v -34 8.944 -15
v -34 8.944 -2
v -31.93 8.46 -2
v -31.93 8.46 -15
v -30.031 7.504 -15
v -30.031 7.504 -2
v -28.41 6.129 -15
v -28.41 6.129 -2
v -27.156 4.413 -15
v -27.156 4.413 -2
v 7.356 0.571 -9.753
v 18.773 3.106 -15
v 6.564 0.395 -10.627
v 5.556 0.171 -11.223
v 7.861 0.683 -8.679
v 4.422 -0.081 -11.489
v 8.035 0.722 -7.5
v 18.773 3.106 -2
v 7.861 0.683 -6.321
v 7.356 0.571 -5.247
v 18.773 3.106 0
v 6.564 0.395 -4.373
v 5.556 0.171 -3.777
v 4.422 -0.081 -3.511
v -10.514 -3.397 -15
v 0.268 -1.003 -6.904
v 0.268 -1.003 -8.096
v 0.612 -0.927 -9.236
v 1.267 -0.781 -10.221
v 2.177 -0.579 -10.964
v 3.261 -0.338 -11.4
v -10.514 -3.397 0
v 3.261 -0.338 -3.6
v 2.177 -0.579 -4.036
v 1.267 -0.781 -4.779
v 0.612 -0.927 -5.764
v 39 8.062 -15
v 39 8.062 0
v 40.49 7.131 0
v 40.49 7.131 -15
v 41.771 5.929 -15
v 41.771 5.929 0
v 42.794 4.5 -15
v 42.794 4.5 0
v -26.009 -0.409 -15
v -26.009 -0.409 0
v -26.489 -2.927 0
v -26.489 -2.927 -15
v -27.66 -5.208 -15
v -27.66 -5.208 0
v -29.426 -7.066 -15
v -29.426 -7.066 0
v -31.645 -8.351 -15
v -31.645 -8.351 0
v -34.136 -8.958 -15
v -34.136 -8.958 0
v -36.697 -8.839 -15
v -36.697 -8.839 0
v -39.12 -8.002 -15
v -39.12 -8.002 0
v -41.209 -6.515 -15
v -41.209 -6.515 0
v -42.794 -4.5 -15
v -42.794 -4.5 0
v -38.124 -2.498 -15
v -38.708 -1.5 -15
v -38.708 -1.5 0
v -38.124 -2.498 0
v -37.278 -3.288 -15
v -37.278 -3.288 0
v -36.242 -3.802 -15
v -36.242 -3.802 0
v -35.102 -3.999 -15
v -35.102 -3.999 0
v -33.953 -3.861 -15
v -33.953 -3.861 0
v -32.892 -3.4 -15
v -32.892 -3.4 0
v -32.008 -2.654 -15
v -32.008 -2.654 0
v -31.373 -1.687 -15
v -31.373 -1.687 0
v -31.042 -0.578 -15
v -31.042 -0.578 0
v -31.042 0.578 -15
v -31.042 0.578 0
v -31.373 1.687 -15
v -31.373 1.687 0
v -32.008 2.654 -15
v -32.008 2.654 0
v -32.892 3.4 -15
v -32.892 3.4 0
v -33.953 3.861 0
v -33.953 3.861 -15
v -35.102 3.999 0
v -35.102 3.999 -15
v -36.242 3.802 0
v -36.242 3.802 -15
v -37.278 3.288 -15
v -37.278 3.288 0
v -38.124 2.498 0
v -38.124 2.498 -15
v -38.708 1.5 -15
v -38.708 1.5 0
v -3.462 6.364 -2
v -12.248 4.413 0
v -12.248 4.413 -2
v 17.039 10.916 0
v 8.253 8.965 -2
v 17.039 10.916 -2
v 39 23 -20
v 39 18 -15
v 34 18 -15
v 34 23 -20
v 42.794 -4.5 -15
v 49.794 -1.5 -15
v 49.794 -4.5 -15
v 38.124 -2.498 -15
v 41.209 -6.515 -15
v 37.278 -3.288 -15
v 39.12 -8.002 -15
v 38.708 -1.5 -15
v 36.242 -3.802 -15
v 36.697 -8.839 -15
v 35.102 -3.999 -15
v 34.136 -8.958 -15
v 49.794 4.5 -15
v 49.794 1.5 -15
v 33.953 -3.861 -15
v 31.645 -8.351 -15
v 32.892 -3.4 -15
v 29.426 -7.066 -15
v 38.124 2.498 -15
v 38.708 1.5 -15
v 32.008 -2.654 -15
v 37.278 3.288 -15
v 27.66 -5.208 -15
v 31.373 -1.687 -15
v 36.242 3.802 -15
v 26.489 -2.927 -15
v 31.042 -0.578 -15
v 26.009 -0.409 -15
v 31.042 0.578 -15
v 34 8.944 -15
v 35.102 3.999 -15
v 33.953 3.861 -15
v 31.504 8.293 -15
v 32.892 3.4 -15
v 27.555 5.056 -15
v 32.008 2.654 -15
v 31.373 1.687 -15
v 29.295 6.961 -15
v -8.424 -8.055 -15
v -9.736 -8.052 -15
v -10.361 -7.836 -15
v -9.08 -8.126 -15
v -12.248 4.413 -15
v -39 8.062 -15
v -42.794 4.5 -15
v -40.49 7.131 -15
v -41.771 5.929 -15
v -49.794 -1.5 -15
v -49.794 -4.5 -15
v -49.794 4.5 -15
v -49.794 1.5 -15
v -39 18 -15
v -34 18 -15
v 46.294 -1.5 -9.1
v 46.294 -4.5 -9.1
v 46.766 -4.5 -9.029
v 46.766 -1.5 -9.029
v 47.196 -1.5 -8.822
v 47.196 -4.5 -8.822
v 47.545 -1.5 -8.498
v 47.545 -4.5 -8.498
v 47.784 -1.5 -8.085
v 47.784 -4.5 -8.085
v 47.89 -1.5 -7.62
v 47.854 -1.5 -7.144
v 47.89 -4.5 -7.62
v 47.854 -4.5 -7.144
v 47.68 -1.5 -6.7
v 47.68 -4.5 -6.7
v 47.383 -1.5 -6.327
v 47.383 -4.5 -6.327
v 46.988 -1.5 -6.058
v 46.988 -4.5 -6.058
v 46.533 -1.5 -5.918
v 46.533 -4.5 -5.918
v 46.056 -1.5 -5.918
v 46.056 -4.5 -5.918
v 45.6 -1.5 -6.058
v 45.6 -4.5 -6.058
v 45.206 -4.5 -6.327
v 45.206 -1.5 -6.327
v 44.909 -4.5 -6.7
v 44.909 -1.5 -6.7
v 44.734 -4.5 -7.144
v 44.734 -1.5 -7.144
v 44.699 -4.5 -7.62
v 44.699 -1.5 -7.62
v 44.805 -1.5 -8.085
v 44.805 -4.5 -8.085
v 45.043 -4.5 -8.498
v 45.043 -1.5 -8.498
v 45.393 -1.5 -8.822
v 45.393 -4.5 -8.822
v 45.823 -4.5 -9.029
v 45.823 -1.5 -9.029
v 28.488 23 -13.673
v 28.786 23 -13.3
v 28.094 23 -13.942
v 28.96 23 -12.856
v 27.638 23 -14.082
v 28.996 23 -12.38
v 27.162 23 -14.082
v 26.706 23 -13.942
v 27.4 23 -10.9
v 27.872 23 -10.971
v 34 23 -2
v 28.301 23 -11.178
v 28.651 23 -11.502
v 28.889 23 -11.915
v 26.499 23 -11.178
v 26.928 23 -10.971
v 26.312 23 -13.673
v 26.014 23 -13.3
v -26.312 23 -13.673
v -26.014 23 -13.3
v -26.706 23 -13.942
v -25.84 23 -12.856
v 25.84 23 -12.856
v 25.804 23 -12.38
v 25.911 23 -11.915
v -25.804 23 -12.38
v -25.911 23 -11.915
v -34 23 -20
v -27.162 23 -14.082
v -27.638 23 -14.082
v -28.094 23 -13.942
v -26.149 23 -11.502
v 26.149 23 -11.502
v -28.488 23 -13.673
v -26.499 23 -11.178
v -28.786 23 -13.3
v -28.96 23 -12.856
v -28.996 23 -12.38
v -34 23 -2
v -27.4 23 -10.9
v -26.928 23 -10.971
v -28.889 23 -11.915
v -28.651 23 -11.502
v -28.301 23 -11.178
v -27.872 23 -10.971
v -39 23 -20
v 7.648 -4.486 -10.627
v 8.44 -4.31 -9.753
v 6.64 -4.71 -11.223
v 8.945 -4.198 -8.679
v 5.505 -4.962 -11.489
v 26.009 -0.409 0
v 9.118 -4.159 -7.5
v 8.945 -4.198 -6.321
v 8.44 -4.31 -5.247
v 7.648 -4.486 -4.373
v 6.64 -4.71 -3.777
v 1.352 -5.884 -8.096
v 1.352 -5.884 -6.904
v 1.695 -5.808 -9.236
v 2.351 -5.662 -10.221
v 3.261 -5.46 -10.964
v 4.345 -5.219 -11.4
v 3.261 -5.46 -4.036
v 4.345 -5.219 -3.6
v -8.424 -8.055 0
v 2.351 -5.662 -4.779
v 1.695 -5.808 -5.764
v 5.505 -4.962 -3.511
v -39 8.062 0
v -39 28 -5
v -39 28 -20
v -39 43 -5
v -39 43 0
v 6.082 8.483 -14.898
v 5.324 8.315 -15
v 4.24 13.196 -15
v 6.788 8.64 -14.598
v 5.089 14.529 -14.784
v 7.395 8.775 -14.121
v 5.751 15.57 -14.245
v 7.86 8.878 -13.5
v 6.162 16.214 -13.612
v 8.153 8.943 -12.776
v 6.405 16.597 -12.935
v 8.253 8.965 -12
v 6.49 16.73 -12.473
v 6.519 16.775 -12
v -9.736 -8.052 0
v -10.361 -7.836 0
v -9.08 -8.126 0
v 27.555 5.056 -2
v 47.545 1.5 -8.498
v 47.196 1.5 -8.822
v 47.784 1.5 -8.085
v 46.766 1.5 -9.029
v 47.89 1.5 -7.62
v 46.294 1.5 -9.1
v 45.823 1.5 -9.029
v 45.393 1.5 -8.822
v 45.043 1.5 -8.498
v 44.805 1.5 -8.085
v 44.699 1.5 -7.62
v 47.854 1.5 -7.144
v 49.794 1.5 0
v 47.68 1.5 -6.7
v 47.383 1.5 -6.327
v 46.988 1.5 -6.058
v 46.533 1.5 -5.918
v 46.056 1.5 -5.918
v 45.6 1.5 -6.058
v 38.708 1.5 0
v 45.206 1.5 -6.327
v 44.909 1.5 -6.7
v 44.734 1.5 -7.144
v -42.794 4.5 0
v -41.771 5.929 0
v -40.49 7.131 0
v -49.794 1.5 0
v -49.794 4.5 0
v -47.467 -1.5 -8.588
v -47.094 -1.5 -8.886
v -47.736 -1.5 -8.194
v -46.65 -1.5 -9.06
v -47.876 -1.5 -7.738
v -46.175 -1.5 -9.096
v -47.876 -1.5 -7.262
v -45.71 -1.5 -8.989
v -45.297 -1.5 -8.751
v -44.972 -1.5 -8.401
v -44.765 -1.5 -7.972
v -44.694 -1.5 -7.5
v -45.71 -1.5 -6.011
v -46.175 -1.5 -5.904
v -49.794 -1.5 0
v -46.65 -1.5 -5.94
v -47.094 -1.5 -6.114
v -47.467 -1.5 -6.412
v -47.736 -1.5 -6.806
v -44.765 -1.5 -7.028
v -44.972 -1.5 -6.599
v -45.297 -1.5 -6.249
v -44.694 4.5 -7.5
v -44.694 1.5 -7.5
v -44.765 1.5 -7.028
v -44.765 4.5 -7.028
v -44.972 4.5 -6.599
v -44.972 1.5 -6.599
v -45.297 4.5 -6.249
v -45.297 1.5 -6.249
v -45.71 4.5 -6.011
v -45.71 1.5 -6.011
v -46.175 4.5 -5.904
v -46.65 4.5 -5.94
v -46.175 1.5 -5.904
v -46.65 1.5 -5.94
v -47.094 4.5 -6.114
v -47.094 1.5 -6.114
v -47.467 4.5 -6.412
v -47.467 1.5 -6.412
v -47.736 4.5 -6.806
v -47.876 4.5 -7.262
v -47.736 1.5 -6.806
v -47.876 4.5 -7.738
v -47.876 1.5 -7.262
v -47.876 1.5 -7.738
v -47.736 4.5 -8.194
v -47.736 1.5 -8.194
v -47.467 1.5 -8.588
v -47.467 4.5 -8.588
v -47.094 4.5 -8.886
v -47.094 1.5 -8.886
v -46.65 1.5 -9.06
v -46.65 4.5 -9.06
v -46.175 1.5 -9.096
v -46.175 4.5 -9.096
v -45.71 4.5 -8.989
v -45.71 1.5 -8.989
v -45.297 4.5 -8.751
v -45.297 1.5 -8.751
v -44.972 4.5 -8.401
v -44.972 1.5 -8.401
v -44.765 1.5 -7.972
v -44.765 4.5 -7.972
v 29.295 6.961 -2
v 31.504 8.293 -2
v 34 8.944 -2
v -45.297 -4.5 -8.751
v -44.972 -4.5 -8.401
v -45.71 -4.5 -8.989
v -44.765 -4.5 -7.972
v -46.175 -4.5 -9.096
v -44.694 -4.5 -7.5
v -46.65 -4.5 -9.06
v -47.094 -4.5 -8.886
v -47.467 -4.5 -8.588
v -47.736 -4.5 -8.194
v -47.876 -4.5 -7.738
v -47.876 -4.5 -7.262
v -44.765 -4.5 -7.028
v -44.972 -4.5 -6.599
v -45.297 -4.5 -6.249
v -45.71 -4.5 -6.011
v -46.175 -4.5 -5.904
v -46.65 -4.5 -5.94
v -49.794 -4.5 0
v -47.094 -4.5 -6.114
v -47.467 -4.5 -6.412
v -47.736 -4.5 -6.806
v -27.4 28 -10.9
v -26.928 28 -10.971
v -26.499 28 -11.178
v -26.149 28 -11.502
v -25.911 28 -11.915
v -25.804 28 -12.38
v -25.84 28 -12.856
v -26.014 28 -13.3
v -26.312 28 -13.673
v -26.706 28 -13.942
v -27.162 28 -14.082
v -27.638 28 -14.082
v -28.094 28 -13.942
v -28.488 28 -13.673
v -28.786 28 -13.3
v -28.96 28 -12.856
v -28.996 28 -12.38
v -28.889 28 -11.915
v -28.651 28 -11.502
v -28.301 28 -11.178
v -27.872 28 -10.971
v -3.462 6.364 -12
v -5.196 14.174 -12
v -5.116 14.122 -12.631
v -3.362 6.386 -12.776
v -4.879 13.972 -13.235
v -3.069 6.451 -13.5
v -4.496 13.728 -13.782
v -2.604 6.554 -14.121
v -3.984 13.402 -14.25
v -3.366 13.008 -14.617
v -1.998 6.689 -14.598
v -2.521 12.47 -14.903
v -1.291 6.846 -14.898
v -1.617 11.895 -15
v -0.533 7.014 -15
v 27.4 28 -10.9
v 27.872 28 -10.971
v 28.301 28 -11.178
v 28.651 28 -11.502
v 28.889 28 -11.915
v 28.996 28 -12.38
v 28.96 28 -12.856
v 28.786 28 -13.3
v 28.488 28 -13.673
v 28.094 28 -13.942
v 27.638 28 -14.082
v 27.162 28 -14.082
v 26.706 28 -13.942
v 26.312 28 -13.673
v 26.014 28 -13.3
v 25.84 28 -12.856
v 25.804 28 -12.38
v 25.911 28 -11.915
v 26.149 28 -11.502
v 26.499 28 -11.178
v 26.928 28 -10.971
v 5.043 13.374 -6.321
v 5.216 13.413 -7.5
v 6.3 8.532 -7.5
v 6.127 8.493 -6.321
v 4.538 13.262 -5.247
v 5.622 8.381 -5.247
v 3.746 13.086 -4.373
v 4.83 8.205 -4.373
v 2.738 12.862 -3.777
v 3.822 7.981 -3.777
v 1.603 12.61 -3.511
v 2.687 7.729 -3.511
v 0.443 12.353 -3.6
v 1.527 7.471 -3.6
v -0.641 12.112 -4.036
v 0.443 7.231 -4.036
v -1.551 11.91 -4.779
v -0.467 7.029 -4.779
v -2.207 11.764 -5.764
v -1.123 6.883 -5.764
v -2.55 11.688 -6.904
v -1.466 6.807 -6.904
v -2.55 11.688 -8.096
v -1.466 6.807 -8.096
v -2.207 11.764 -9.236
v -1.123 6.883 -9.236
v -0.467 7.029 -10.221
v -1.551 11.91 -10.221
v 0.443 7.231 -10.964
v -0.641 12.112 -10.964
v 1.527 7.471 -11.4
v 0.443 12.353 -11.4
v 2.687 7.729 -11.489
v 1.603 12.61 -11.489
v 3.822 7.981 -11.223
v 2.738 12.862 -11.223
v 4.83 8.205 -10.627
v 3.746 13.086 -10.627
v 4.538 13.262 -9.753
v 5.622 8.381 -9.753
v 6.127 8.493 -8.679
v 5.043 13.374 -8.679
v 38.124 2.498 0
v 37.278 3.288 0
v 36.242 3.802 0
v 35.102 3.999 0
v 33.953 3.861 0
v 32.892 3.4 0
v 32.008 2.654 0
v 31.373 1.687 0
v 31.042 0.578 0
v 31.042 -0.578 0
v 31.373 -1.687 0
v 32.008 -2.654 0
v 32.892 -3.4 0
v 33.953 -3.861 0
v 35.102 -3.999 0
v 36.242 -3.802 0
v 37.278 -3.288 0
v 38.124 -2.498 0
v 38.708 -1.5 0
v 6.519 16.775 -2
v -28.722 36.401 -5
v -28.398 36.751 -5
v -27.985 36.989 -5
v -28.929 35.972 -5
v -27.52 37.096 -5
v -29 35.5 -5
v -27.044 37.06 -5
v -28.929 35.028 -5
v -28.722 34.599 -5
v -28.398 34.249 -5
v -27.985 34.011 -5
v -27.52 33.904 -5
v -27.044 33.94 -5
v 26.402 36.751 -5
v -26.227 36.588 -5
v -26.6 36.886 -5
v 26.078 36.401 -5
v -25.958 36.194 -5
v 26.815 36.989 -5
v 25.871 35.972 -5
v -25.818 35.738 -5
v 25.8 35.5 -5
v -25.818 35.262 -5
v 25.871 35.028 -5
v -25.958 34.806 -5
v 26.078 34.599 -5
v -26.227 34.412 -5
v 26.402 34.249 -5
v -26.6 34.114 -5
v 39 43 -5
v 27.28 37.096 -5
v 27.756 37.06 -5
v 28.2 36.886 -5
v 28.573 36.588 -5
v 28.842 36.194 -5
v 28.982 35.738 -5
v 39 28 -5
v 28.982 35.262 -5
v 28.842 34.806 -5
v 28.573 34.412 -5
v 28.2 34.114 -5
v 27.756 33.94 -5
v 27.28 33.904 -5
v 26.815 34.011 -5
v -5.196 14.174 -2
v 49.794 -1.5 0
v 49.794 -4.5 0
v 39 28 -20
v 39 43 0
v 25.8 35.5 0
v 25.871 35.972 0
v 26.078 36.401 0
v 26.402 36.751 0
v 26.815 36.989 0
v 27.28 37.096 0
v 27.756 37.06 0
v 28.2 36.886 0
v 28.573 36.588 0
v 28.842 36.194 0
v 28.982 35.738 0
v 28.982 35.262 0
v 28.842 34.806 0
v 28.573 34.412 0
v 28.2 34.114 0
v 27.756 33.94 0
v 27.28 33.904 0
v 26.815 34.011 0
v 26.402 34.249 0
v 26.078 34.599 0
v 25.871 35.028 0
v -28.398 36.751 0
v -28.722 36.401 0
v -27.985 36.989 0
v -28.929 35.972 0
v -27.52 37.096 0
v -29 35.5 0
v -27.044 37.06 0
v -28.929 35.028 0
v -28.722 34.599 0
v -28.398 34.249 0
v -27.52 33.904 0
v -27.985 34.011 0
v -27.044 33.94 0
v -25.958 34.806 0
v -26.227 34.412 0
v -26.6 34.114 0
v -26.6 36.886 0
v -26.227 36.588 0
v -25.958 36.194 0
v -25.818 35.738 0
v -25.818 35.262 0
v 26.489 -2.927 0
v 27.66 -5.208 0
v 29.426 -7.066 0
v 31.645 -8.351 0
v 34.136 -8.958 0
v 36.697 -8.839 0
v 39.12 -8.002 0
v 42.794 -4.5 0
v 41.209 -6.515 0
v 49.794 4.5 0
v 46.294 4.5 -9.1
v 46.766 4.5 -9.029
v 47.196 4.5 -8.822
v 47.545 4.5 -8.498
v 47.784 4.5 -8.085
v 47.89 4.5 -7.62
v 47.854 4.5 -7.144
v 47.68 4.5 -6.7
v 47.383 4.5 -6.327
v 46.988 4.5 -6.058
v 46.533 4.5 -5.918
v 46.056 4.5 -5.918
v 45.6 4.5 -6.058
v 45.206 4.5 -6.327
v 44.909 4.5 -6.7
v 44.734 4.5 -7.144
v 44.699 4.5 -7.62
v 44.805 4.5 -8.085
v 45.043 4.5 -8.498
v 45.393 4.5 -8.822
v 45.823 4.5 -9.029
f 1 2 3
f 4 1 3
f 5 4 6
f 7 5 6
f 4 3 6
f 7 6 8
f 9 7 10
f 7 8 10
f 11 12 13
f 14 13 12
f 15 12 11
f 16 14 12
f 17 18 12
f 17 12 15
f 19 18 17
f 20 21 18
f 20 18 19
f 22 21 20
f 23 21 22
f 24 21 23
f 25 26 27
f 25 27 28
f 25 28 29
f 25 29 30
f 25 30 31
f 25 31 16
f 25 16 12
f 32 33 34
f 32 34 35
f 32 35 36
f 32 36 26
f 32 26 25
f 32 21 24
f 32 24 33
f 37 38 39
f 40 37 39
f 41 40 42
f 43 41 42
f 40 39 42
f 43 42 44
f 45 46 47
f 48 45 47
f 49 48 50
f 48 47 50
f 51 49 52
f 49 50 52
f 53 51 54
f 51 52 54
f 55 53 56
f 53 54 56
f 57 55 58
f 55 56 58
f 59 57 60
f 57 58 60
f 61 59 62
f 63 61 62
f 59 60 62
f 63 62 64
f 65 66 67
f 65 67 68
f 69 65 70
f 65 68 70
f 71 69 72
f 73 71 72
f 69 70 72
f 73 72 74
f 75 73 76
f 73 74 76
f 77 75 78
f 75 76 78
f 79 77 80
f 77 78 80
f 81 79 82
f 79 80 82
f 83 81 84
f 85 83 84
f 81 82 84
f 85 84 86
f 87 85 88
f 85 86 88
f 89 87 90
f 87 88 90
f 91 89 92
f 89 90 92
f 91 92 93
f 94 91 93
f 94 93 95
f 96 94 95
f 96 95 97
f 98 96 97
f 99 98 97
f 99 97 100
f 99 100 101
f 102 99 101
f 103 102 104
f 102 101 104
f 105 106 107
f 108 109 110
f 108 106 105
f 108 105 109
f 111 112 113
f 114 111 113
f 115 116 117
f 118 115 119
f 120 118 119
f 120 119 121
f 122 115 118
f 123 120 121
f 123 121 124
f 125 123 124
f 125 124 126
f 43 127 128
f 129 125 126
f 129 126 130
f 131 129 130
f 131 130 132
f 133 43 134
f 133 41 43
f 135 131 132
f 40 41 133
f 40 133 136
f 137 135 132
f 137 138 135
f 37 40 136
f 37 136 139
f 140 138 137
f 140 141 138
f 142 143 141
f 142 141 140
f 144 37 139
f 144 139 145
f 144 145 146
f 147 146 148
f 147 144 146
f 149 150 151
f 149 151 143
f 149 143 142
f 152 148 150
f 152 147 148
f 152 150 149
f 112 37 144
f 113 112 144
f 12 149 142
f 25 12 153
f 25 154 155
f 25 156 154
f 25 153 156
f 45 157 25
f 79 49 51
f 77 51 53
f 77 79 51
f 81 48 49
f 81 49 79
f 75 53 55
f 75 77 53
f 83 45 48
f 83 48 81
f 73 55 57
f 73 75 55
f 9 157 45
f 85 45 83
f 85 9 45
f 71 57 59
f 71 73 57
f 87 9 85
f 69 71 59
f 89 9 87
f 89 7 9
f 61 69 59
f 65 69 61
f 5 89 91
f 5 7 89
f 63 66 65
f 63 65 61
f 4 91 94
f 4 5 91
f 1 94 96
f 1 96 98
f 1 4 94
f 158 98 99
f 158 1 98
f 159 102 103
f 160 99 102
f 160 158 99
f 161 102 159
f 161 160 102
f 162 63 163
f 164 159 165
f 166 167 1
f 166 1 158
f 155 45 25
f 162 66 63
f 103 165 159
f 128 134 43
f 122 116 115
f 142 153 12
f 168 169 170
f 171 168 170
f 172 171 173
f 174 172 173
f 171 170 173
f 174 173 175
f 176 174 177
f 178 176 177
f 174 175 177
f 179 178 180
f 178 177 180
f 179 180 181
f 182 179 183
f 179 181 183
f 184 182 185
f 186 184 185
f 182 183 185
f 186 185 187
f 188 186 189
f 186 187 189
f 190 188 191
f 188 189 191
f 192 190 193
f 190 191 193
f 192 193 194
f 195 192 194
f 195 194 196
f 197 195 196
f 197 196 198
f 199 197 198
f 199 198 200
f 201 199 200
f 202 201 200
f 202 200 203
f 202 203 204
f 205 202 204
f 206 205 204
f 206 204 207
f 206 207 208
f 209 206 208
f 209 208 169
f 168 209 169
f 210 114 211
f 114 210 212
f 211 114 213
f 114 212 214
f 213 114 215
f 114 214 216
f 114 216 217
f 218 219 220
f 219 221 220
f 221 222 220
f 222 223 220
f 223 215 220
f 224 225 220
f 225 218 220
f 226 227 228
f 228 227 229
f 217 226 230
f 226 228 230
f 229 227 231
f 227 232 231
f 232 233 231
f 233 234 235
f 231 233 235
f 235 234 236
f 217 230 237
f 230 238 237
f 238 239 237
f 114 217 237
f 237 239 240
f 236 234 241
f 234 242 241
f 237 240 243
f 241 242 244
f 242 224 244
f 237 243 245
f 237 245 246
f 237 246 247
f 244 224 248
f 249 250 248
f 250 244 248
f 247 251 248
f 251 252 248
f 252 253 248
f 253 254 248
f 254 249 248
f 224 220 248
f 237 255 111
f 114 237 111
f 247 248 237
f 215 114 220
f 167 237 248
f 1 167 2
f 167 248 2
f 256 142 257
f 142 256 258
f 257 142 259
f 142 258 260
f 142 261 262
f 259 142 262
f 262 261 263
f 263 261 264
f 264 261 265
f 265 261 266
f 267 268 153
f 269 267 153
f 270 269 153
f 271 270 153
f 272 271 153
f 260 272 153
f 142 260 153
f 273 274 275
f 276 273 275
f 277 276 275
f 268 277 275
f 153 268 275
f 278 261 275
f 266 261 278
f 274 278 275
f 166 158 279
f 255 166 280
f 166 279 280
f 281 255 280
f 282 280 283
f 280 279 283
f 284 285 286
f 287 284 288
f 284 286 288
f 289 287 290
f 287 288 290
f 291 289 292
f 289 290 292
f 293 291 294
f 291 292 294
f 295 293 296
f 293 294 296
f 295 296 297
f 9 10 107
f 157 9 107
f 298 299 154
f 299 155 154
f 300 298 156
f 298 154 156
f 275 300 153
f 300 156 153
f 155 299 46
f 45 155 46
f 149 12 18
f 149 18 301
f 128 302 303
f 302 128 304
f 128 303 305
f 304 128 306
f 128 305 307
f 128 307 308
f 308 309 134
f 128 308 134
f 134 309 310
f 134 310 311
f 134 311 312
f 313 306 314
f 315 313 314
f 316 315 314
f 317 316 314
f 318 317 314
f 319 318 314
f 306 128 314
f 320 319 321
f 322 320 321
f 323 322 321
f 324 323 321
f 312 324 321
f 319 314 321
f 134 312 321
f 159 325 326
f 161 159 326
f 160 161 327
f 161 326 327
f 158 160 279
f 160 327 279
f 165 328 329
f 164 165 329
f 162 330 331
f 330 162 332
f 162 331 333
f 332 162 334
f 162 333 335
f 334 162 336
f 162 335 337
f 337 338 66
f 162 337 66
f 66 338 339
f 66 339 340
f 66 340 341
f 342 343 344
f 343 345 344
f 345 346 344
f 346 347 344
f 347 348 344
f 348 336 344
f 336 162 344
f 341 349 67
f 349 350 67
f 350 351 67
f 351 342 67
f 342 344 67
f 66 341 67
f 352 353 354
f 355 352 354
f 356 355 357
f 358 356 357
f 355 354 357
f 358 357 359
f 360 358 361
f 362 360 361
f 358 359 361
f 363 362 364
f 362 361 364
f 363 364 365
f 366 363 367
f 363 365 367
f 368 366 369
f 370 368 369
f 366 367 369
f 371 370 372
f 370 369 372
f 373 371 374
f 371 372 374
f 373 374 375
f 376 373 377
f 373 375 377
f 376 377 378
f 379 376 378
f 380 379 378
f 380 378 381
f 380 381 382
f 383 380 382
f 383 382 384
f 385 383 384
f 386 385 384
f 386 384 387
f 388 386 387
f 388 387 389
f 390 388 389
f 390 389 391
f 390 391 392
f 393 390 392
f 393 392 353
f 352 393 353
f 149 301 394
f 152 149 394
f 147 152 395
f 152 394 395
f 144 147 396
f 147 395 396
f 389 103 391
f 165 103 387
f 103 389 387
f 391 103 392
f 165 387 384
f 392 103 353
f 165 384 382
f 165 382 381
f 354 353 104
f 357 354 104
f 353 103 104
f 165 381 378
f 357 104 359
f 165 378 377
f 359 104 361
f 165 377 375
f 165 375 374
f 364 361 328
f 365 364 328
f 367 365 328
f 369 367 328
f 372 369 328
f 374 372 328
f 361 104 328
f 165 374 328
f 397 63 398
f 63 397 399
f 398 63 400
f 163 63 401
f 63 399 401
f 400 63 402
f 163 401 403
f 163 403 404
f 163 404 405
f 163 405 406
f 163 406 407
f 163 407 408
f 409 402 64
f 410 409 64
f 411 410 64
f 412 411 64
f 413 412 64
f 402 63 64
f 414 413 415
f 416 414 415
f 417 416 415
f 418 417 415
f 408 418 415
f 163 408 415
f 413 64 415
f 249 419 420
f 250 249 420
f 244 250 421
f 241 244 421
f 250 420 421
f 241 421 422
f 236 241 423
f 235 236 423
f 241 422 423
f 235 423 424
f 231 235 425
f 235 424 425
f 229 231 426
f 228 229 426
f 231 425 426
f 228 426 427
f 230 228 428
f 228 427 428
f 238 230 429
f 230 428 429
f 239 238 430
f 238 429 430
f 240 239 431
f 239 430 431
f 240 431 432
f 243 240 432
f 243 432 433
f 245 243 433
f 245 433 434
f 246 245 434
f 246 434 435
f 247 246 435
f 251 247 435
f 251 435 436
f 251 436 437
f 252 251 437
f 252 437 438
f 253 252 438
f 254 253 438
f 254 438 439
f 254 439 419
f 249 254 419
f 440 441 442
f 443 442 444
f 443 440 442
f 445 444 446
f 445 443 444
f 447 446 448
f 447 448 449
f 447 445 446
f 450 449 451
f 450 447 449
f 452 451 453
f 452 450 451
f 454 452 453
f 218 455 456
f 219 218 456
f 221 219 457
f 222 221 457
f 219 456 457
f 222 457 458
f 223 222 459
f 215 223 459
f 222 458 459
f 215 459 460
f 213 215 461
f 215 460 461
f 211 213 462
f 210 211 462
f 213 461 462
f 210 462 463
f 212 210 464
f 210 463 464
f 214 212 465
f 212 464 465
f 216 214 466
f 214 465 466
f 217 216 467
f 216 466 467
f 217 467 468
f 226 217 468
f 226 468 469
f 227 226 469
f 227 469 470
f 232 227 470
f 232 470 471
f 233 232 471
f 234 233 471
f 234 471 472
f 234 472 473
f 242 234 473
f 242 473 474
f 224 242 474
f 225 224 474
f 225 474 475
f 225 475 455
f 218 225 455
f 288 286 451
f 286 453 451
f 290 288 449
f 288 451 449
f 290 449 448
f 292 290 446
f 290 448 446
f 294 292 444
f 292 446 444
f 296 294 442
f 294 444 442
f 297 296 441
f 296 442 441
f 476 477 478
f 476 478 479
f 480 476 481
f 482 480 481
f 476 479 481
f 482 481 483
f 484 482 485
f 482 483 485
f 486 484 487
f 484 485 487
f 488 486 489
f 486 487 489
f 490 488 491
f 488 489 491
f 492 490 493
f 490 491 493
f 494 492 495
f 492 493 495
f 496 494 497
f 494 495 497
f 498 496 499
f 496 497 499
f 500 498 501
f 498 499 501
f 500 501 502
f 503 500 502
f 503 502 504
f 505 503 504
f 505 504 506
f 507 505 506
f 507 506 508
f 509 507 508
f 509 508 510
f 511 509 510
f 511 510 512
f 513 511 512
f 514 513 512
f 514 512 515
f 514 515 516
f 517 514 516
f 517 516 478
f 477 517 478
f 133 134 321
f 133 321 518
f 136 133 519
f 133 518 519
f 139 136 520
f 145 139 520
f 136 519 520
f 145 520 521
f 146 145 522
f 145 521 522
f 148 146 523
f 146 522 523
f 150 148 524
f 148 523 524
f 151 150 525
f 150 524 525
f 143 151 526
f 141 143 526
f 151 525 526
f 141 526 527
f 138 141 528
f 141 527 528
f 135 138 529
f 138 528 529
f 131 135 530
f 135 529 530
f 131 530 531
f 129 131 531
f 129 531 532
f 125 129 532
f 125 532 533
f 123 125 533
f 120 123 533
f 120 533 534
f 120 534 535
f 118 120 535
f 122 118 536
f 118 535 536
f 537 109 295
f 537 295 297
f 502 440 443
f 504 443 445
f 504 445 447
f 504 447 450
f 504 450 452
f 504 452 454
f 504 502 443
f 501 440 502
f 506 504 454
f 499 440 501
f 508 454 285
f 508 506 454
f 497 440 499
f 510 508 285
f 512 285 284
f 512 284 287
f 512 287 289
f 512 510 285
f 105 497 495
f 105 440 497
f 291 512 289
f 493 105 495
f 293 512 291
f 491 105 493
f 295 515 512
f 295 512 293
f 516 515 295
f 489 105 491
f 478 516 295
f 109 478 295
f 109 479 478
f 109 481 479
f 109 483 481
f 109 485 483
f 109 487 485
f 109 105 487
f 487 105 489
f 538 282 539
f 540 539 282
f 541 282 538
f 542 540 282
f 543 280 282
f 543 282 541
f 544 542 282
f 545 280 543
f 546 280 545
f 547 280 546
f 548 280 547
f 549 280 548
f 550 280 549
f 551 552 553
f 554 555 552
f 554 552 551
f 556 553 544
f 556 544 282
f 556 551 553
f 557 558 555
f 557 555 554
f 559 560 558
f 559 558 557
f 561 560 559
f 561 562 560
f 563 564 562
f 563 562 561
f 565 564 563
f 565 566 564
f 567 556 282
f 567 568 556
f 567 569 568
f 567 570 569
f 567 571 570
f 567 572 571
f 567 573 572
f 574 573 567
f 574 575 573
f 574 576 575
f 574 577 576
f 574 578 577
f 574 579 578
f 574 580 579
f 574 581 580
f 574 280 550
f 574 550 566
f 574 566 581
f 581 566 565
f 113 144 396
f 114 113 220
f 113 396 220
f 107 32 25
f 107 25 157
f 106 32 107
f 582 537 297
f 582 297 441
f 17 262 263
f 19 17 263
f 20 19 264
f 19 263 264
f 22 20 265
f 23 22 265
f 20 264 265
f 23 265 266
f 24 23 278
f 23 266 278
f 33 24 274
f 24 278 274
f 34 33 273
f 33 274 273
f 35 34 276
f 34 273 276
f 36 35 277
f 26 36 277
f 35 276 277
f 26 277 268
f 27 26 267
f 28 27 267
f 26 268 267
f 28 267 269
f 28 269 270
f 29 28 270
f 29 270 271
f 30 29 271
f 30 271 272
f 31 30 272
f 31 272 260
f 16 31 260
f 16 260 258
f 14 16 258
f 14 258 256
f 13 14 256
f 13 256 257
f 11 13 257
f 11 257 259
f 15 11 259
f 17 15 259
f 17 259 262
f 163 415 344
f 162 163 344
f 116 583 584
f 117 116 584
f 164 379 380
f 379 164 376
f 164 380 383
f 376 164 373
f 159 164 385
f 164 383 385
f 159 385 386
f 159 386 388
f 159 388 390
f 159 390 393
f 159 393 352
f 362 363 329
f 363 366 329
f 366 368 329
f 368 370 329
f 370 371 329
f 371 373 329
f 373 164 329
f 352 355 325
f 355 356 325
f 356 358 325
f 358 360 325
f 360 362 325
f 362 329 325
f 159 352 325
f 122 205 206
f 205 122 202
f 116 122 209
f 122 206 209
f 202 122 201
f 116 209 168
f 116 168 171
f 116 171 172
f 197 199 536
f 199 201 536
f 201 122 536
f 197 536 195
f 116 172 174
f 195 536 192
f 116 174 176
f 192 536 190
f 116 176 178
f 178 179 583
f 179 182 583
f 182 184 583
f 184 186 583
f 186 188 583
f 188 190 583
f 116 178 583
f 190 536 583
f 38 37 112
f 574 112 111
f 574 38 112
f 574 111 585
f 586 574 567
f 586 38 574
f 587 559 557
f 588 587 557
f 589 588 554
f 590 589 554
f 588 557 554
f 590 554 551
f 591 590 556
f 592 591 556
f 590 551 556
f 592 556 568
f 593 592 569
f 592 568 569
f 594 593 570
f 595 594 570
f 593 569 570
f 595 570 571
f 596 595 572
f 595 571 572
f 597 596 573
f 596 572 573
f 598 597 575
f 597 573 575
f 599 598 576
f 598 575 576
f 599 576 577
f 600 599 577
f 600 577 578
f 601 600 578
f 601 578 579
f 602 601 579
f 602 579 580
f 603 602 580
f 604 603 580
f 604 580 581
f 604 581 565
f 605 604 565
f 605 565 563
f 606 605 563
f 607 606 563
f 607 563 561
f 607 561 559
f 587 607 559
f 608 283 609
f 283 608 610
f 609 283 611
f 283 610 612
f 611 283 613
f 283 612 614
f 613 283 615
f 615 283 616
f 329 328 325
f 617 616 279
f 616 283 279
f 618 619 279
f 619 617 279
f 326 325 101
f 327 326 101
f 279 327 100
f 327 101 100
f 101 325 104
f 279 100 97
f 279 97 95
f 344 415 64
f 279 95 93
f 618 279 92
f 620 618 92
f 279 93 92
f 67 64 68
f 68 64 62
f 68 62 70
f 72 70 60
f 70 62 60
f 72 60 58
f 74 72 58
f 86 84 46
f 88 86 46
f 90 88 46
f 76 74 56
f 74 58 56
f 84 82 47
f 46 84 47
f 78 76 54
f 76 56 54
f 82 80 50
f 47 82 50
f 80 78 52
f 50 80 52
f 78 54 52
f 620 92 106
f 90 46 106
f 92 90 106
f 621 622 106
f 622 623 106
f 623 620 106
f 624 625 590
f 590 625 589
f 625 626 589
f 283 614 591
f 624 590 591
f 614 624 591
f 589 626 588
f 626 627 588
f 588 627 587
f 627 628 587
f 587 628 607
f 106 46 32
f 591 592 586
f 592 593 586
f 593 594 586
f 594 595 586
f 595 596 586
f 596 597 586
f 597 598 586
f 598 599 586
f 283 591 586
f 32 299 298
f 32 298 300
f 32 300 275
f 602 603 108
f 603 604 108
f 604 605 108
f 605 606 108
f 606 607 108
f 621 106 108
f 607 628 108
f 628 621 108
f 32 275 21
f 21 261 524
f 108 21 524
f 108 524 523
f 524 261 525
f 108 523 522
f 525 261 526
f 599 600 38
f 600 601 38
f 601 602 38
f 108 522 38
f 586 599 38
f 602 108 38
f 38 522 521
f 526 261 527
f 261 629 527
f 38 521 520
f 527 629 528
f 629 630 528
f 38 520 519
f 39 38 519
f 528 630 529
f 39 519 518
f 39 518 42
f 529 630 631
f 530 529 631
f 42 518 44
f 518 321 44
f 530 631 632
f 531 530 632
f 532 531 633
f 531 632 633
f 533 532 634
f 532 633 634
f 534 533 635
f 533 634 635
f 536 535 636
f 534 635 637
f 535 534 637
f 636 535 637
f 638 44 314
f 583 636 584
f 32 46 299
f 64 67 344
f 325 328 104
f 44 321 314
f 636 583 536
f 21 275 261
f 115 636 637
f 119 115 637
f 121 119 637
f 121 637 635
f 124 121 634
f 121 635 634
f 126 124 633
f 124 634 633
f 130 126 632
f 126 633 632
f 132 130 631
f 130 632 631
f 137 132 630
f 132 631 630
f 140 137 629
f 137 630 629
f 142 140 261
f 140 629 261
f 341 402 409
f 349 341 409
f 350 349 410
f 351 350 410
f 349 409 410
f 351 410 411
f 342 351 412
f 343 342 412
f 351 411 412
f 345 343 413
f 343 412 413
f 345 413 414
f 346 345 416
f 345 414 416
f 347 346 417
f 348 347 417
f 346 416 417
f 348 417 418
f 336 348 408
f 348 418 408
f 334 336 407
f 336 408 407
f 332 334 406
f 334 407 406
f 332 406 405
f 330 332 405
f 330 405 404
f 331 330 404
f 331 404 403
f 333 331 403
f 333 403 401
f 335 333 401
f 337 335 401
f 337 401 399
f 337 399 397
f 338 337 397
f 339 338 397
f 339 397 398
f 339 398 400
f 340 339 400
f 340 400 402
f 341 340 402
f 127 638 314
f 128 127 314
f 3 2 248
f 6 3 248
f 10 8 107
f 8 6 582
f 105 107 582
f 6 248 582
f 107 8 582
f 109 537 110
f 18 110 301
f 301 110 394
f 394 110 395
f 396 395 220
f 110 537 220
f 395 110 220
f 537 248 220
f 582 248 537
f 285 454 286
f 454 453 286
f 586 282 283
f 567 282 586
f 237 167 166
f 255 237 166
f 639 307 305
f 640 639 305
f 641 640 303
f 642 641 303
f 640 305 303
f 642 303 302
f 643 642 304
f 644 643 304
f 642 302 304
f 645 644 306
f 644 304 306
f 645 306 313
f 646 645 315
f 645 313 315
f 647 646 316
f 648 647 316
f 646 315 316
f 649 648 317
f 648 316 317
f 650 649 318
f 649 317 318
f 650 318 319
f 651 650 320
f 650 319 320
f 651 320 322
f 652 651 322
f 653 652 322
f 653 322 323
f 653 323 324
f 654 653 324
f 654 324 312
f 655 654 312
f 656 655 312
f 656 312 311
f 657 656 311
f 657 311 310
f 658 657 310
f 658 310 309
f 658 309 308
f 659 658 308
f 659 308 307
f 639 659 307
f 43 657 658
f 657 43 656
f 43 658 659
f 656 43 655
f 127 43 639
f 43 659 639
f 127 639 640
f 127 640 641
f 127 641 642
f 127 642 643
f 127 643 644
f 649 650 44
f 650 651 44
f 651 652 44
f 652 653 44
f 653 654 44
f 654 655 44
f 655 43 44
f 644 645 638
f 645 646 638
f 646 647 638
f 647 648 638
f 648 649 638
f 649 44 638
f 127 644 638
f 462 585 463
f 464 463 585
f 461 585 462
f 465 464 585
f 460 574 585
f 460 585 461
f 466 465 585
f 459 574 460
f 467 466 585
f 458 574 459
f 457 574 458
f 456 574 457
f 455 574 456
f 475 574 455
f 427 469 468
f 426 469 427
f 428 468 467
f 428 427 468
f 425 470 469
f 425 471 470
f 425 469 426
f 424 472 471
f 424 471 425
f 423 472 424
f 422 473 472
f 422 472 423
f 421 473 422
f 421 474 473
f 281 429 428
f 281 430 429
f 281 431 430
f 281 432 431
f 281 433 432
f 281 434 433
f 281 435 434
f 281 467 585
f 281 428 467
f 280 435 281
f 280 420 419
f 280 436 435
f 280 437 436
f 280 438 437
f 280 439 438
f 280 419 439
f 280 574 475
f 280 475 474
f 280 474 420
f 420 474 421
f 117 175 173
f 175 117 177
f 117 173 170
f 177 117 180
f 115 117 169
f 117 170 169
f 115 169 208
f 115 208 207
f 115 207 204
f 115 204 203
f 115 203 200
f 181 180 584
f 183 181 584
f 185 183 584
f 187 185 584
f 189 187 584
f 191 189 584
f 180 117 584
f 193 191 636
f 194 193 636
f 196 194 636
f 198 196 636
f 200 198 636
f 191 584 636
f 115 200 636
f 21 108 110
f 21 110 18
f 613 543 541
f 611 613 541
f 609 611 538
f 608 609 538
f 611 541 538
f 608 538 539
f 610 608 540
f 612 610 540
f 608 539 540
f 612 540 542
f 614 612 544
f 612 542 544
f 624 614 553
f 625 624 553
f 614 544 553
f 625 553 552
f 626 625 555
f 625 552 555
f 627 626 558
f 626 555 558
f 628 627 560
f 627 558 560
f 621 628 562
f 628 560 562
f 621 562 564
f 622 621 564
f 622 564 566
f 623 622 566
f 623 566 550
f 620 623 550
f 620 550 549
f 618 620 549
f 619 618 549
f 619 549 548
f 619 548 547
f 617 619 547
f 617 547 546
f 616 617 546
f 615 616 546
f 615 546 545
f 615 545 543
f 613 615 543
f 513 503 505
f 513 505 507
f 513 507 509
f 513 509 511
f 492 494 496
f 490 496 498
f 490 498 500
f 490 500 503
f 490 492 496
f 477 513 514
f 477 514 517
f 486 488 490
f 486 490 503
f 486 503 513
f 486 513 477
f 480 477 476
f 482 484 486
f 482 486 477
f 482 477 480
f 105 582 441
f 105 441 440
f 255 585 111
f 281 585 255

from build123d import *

# Parameters (mm, degrees)
BOSS_EXTRUDE1_DEPTH = 15
CUT_EXTRUDE1_START  = -13
CUT_EXTRUDE1_DEPTH  = 13
BOSS_EXTRUDE2_DEPTH = 13
SKETCH5_R           = 4
CUT_EXTRUDE2_DEPTH  = 18
SKETCH6_W           = 78
SKETCH6_H           = 5
BOSS_EXTRUDE3_DEPTH = 15
SKETCH7_W           = 78
SKETCH7_H           = 5
BOSS_EXTRUDE4_DEPTH = 5
CUT_EXTRUDE3_REACH  = 69.479
SKETCH8_R           = 1.6
CUT_EXTRUDE4_REACH  = 67.18
SKETCH9_R           = 1.6
CHAMFER1_SIZE       = 5
FILLET1_R           = 3
FILLET2_R           = 3
SKETCH10_R          = 1.6
CUT_EXTRUDE5_DEPTH  = 72.66390448


with BuildPart() as part:
    # Sketch2 → Boss-Extrude1 (new body)
    with BuildSketch(Plane.XY):
        with BuildLine():
            Line((-39, 28), (39, 28))
            Line((39, 28), (39, 8.062257748))
            ThreePointArc((39, 8.062257748), (41.160225429, 6.561373535), (42.794228634, 4.5))
            Line((42.794228634, 4.5), (49.794228634, 4.5))
            Line((49.794228634, 4.5), (49.794228634, 1.5))
            Line((49.794228634, 1.5), (38.708099244, 1.5))
            ThreePointArc((38.708099244, 1.5), (31, 0), (38.708099244, -1.5))
            Line((38.708099244, -1.5), (49.794228634, -1.5))
            Line((49.794228634, -1.5), (49.794228634, -4.5))
            Line((49.794228634, -4.5), (42.794228634, -4.5))
            ThreePointArc((42.794228634, -4.5), (32.868581203, -8.743972433), (26.009276503, -0.408522957))
            Line((26.009276503, -0.408522957), (-9.429697367, -8.278133847))
            Line((-9.429697367, -8.278133847), (-26.009276503, -0.408522957))
            ThreePointArc((-26.009276503, -0.408522957), (-32.868581203, -8.743972433), (-42.794228634, -4.5))
            Line((-42.794228634, -4.5), (-49.794228634, -4.5))
            Line((-49.794228634, -4.5), (-49.794228634, -1.5))
            Line((-49.794228634, -1.5), (-38.708099244, -1.5))
            ThreePointArc((-38.708099244, -1.5), (-31, 0), (-38.708099244, 1.5))
            Line((-38.708099244, 1.5), (-49.794228634, 1.5))
            Line((-49.794228634, 1.5), (-49.794228634, 4.5))
            Line((-49.794228634, 4.5), (-42.794228634, 4.5))
            ThreePointArc((-42.794228634, 4.5), (-41.160225429, 6.561373535), (-39, 8.062257748))
            Line((-39, 8.062257748), (-39, 28))
        make_face()
        Polygon((-10.513599328, -3.397031867), (-12.247842467, 4.4127313), (17.038769412, 10.916143071), (18.773012551, 3.106379903), align=None, mode=Mode.SUBTRACT)
    extrude(amount=-BOSS_EXTRUDE1_DEPTH)

    # Sketch3 → Cut-Extrude1 (cut)
    with BuildSketch(Plane(origin=(0, 0, -15), x_dir=(-1, 0, 0), z_dir=(0, 0, -1)).offset(CUT_EXTRUDE1_START)):
        with BuildLine():
            Line((-34, 8.94427191), (-34, 23))
            Line((-34, 23), (34, 23))
            Line((34, 23), (34, 8.94427191))
            ThreePointArc((34, 8.94427191), (30.031333309, 7.504155603), (27.156034009, 4.4127313))
            Line((27.156034009, 4.4127313), (12.247842467, 4.4127313))
            Line((12.247842467, 4.4127313), (10.513599328, -3.397031867))
            Line((10.513599328, -3.397031867), (-27.55471368, 5.056452473))
            ThreePointArc((-27.55471368, 5.056452473), (-30.351398032, 7.706523194), (-34, 8.94427191))
        make_face()
    extrude(amount=CUT_EXTRUDE1_DEPTH, mode=Mode.SUBTRACT)

    # Sketch4 → Boss-Extrude2 (add)
    with BuildSketch(Plane(origin=(0, 0, -2), x_dir=(-1, 0, 0), z_dir=(0, 0, -1))):
        Polygon((-8.252785849, 8.96511954), (-6.51854271, 16.774882707), (5.196102042, 14.173517999), (3.461858903, 6.363754831), align=None)
    extrude(amount=BOSS_EXTRUDE2_DEPTH)

    # Sketch5 → Cut-Extrude2 (cut)
    with BuildSketch(Plane(origin=(1.308726989, -5.893549531, 0), x_dir=(0.9762203959642156, 0.21678039234089003, 0), z_dir=(0.21678039234089003, -0.9762203959642156, 0))):
        with Locations((4, -7.5)):
            Circle(SKETCH5_R)
    extrude(amount=-CUT_EXTRUDE2_DEPTH, mode=Mode.SUBTRACT)

    # Sketch6 → Boss-Extrude3 (add)
    with BuildSketch(Plane(origin=(0, 28, 0), x_dir=(1, 0, 0), z_dir=(0, 1, 0))):
        with Locations((0, 2.5)):
            Rectangle(SKETCH6_W, SKETCH6_H)
    extrude(amount=BOSS_EXTRUDE3_DEPTH)

    # Sketch7 → Boss-Extrude4 (add)
    with BuildSketch(Plane(origin=(0, 0, -15), x_dir=(-1, 0, 0), z_dir=(0, 0, -1))):
        with Locations((0, 25.5)):
            Rectangle(SKETCH7_W, SKETCH7_H)
    extrude(amount=BOSS_EXTRUDE4_DEPTH)

    # Sketch8 → Cut-Extrude3 (cut, up to next)
    with BuildSketch(Plane(origin=(0, 0, -5), x_dir=(-1, 0, 0), z_dir=(0, 0, -1)), mode=Mode.PRIVATE) as cut_extrude3_sk1:
        with Locations((27.4, 35.5)):
            Circle(SKETCH8_R)
    cut_extrude3_tool1 = extrude(cut_extrude3_sk1.sketch, amount=-CUT_EXTRUDE3_REACH, mode=Mode.PRIVATE) & part.part
    # Sketch8 → Cut-Extrude3 (cut, up to next)
    with BuildSketch(Plane(origin=(0, 0, -5), x_dir=(-1, 0, 0), z_dir=(0, 0, -1)), mode=Mode.PRIVATE) as cut_extrude3_sk2:
        with Locations((-27.4, 35.5)):
            Circle(SKETCH8_R)
    cut_extrude3_tool2 = extrude(cut_extrude3_sk2.sketch, amount=-CUT_EXTRUDE3_REACH, mode=Mode.PRIVATE) & part.part
    add(cut_extrude3_tool1.solids().sort_by_distance((-27.4, 35.5, -5))[0], mode=Mode.SUBTRACT)
    add(cut_extrude3_tool2.solids().sort_by_distance((27.4, 35.5, -5))[0], mode=Mode.SUBTRACT)

    # Sketch9 → Cut-Extrude4 (cut, up to next)
    with BuildSketch(Plane(origin=(0, 28, 0), x_dir=(1, 0, 0), z_dir=(0, 1, 0)), mode=Mode.PRIVATE) as cut_extrude4_sk1:
        with Locations(Location((-27.4, 12.5, 0), (0, 0, 270))):
            Circle(SKETCH9_R)
    cut_extrude4_tool1 = extrude(cut_extrude4_sk1.sketch, amount=-CUT_EXTRUDE4_REACH, mode=Mode.PRIVATE) & part.part
    # Sketch9 → Cut-Extrude4 (cut, up to next)
    with BuildSketch(Plane(origin=(0, 28, 0), x_dir=(1, 0, 0), z_dir=(0, 1, 0)), mode=Mode.PRIVATE) as cut_extrude4_sk2:
        with Locations(Location((27.4, 12.5, 0), (0, 0, 270))):
            Circle(SKETCH9_R)
    cut_extrude4_tool2 = extrude(cut_extrude4_sk2.sketch, amount=-CUT_EXTRUDE4_REACH, mode=Mode.PRIVATE) & part.part
    add(cut_extrude4_tool1.solids().sort_by_distance((-27.4, 28, -12.5))[0], mode=Mode.SUBTRACT)
    add(cut_extrude4_tool2.solids().sort_by_distance((27.4, 28, -12.5))[0], mode=Mode.SUBTRACT)

    # Chamfer1
    chamfer1_edges = [part.edges().sort_by_distance(p)[0] for p in [
        (36.5, 23, -15),
        (-36.5, 23, -15),
    ]]
    chamfer(chamfer1_edges, length=CHAMFER1_SIZE - 0.0001)  # a hair under: the kernel refuses the full size

    # Fillet1
    fillet1_edges = [part.edges().sort_by_distance(p)[0] for p in [
        (-4.328980472, 10.268636415, -15),
        (0.661220334, 15.474200353, -15),
        (7.385664279, 12.870001123, -15),
    ]]
    fillet(fillet1_edges, radius=FILLET1_R)

    # Fillet2
    fillet2_edges = [part.edges().sort_by_distance(p)[0] for p in [
        (-9.429697367, -8.278133847, -7.5),
    ]]
    fillet(fillet2_edges, radius=FILLET2_R)

    # Sketch10 → Cut-Extrude5 (cut, through all)
    with BuildSketch(Plane.XZ.offset(4.5)):
        with Locations(Location((46.294228634, -7.5, 0), (0, 0, 270))):
            Circle(SKETCH10_R)
        with Locations((-46.294228634, -7.5)):
            Circle(SKETCH10_R)
    extrude(amount=-CUT_EXTRUDE5_DEPTH, mode=Mode.SUBTRACT)


solid = part.part
